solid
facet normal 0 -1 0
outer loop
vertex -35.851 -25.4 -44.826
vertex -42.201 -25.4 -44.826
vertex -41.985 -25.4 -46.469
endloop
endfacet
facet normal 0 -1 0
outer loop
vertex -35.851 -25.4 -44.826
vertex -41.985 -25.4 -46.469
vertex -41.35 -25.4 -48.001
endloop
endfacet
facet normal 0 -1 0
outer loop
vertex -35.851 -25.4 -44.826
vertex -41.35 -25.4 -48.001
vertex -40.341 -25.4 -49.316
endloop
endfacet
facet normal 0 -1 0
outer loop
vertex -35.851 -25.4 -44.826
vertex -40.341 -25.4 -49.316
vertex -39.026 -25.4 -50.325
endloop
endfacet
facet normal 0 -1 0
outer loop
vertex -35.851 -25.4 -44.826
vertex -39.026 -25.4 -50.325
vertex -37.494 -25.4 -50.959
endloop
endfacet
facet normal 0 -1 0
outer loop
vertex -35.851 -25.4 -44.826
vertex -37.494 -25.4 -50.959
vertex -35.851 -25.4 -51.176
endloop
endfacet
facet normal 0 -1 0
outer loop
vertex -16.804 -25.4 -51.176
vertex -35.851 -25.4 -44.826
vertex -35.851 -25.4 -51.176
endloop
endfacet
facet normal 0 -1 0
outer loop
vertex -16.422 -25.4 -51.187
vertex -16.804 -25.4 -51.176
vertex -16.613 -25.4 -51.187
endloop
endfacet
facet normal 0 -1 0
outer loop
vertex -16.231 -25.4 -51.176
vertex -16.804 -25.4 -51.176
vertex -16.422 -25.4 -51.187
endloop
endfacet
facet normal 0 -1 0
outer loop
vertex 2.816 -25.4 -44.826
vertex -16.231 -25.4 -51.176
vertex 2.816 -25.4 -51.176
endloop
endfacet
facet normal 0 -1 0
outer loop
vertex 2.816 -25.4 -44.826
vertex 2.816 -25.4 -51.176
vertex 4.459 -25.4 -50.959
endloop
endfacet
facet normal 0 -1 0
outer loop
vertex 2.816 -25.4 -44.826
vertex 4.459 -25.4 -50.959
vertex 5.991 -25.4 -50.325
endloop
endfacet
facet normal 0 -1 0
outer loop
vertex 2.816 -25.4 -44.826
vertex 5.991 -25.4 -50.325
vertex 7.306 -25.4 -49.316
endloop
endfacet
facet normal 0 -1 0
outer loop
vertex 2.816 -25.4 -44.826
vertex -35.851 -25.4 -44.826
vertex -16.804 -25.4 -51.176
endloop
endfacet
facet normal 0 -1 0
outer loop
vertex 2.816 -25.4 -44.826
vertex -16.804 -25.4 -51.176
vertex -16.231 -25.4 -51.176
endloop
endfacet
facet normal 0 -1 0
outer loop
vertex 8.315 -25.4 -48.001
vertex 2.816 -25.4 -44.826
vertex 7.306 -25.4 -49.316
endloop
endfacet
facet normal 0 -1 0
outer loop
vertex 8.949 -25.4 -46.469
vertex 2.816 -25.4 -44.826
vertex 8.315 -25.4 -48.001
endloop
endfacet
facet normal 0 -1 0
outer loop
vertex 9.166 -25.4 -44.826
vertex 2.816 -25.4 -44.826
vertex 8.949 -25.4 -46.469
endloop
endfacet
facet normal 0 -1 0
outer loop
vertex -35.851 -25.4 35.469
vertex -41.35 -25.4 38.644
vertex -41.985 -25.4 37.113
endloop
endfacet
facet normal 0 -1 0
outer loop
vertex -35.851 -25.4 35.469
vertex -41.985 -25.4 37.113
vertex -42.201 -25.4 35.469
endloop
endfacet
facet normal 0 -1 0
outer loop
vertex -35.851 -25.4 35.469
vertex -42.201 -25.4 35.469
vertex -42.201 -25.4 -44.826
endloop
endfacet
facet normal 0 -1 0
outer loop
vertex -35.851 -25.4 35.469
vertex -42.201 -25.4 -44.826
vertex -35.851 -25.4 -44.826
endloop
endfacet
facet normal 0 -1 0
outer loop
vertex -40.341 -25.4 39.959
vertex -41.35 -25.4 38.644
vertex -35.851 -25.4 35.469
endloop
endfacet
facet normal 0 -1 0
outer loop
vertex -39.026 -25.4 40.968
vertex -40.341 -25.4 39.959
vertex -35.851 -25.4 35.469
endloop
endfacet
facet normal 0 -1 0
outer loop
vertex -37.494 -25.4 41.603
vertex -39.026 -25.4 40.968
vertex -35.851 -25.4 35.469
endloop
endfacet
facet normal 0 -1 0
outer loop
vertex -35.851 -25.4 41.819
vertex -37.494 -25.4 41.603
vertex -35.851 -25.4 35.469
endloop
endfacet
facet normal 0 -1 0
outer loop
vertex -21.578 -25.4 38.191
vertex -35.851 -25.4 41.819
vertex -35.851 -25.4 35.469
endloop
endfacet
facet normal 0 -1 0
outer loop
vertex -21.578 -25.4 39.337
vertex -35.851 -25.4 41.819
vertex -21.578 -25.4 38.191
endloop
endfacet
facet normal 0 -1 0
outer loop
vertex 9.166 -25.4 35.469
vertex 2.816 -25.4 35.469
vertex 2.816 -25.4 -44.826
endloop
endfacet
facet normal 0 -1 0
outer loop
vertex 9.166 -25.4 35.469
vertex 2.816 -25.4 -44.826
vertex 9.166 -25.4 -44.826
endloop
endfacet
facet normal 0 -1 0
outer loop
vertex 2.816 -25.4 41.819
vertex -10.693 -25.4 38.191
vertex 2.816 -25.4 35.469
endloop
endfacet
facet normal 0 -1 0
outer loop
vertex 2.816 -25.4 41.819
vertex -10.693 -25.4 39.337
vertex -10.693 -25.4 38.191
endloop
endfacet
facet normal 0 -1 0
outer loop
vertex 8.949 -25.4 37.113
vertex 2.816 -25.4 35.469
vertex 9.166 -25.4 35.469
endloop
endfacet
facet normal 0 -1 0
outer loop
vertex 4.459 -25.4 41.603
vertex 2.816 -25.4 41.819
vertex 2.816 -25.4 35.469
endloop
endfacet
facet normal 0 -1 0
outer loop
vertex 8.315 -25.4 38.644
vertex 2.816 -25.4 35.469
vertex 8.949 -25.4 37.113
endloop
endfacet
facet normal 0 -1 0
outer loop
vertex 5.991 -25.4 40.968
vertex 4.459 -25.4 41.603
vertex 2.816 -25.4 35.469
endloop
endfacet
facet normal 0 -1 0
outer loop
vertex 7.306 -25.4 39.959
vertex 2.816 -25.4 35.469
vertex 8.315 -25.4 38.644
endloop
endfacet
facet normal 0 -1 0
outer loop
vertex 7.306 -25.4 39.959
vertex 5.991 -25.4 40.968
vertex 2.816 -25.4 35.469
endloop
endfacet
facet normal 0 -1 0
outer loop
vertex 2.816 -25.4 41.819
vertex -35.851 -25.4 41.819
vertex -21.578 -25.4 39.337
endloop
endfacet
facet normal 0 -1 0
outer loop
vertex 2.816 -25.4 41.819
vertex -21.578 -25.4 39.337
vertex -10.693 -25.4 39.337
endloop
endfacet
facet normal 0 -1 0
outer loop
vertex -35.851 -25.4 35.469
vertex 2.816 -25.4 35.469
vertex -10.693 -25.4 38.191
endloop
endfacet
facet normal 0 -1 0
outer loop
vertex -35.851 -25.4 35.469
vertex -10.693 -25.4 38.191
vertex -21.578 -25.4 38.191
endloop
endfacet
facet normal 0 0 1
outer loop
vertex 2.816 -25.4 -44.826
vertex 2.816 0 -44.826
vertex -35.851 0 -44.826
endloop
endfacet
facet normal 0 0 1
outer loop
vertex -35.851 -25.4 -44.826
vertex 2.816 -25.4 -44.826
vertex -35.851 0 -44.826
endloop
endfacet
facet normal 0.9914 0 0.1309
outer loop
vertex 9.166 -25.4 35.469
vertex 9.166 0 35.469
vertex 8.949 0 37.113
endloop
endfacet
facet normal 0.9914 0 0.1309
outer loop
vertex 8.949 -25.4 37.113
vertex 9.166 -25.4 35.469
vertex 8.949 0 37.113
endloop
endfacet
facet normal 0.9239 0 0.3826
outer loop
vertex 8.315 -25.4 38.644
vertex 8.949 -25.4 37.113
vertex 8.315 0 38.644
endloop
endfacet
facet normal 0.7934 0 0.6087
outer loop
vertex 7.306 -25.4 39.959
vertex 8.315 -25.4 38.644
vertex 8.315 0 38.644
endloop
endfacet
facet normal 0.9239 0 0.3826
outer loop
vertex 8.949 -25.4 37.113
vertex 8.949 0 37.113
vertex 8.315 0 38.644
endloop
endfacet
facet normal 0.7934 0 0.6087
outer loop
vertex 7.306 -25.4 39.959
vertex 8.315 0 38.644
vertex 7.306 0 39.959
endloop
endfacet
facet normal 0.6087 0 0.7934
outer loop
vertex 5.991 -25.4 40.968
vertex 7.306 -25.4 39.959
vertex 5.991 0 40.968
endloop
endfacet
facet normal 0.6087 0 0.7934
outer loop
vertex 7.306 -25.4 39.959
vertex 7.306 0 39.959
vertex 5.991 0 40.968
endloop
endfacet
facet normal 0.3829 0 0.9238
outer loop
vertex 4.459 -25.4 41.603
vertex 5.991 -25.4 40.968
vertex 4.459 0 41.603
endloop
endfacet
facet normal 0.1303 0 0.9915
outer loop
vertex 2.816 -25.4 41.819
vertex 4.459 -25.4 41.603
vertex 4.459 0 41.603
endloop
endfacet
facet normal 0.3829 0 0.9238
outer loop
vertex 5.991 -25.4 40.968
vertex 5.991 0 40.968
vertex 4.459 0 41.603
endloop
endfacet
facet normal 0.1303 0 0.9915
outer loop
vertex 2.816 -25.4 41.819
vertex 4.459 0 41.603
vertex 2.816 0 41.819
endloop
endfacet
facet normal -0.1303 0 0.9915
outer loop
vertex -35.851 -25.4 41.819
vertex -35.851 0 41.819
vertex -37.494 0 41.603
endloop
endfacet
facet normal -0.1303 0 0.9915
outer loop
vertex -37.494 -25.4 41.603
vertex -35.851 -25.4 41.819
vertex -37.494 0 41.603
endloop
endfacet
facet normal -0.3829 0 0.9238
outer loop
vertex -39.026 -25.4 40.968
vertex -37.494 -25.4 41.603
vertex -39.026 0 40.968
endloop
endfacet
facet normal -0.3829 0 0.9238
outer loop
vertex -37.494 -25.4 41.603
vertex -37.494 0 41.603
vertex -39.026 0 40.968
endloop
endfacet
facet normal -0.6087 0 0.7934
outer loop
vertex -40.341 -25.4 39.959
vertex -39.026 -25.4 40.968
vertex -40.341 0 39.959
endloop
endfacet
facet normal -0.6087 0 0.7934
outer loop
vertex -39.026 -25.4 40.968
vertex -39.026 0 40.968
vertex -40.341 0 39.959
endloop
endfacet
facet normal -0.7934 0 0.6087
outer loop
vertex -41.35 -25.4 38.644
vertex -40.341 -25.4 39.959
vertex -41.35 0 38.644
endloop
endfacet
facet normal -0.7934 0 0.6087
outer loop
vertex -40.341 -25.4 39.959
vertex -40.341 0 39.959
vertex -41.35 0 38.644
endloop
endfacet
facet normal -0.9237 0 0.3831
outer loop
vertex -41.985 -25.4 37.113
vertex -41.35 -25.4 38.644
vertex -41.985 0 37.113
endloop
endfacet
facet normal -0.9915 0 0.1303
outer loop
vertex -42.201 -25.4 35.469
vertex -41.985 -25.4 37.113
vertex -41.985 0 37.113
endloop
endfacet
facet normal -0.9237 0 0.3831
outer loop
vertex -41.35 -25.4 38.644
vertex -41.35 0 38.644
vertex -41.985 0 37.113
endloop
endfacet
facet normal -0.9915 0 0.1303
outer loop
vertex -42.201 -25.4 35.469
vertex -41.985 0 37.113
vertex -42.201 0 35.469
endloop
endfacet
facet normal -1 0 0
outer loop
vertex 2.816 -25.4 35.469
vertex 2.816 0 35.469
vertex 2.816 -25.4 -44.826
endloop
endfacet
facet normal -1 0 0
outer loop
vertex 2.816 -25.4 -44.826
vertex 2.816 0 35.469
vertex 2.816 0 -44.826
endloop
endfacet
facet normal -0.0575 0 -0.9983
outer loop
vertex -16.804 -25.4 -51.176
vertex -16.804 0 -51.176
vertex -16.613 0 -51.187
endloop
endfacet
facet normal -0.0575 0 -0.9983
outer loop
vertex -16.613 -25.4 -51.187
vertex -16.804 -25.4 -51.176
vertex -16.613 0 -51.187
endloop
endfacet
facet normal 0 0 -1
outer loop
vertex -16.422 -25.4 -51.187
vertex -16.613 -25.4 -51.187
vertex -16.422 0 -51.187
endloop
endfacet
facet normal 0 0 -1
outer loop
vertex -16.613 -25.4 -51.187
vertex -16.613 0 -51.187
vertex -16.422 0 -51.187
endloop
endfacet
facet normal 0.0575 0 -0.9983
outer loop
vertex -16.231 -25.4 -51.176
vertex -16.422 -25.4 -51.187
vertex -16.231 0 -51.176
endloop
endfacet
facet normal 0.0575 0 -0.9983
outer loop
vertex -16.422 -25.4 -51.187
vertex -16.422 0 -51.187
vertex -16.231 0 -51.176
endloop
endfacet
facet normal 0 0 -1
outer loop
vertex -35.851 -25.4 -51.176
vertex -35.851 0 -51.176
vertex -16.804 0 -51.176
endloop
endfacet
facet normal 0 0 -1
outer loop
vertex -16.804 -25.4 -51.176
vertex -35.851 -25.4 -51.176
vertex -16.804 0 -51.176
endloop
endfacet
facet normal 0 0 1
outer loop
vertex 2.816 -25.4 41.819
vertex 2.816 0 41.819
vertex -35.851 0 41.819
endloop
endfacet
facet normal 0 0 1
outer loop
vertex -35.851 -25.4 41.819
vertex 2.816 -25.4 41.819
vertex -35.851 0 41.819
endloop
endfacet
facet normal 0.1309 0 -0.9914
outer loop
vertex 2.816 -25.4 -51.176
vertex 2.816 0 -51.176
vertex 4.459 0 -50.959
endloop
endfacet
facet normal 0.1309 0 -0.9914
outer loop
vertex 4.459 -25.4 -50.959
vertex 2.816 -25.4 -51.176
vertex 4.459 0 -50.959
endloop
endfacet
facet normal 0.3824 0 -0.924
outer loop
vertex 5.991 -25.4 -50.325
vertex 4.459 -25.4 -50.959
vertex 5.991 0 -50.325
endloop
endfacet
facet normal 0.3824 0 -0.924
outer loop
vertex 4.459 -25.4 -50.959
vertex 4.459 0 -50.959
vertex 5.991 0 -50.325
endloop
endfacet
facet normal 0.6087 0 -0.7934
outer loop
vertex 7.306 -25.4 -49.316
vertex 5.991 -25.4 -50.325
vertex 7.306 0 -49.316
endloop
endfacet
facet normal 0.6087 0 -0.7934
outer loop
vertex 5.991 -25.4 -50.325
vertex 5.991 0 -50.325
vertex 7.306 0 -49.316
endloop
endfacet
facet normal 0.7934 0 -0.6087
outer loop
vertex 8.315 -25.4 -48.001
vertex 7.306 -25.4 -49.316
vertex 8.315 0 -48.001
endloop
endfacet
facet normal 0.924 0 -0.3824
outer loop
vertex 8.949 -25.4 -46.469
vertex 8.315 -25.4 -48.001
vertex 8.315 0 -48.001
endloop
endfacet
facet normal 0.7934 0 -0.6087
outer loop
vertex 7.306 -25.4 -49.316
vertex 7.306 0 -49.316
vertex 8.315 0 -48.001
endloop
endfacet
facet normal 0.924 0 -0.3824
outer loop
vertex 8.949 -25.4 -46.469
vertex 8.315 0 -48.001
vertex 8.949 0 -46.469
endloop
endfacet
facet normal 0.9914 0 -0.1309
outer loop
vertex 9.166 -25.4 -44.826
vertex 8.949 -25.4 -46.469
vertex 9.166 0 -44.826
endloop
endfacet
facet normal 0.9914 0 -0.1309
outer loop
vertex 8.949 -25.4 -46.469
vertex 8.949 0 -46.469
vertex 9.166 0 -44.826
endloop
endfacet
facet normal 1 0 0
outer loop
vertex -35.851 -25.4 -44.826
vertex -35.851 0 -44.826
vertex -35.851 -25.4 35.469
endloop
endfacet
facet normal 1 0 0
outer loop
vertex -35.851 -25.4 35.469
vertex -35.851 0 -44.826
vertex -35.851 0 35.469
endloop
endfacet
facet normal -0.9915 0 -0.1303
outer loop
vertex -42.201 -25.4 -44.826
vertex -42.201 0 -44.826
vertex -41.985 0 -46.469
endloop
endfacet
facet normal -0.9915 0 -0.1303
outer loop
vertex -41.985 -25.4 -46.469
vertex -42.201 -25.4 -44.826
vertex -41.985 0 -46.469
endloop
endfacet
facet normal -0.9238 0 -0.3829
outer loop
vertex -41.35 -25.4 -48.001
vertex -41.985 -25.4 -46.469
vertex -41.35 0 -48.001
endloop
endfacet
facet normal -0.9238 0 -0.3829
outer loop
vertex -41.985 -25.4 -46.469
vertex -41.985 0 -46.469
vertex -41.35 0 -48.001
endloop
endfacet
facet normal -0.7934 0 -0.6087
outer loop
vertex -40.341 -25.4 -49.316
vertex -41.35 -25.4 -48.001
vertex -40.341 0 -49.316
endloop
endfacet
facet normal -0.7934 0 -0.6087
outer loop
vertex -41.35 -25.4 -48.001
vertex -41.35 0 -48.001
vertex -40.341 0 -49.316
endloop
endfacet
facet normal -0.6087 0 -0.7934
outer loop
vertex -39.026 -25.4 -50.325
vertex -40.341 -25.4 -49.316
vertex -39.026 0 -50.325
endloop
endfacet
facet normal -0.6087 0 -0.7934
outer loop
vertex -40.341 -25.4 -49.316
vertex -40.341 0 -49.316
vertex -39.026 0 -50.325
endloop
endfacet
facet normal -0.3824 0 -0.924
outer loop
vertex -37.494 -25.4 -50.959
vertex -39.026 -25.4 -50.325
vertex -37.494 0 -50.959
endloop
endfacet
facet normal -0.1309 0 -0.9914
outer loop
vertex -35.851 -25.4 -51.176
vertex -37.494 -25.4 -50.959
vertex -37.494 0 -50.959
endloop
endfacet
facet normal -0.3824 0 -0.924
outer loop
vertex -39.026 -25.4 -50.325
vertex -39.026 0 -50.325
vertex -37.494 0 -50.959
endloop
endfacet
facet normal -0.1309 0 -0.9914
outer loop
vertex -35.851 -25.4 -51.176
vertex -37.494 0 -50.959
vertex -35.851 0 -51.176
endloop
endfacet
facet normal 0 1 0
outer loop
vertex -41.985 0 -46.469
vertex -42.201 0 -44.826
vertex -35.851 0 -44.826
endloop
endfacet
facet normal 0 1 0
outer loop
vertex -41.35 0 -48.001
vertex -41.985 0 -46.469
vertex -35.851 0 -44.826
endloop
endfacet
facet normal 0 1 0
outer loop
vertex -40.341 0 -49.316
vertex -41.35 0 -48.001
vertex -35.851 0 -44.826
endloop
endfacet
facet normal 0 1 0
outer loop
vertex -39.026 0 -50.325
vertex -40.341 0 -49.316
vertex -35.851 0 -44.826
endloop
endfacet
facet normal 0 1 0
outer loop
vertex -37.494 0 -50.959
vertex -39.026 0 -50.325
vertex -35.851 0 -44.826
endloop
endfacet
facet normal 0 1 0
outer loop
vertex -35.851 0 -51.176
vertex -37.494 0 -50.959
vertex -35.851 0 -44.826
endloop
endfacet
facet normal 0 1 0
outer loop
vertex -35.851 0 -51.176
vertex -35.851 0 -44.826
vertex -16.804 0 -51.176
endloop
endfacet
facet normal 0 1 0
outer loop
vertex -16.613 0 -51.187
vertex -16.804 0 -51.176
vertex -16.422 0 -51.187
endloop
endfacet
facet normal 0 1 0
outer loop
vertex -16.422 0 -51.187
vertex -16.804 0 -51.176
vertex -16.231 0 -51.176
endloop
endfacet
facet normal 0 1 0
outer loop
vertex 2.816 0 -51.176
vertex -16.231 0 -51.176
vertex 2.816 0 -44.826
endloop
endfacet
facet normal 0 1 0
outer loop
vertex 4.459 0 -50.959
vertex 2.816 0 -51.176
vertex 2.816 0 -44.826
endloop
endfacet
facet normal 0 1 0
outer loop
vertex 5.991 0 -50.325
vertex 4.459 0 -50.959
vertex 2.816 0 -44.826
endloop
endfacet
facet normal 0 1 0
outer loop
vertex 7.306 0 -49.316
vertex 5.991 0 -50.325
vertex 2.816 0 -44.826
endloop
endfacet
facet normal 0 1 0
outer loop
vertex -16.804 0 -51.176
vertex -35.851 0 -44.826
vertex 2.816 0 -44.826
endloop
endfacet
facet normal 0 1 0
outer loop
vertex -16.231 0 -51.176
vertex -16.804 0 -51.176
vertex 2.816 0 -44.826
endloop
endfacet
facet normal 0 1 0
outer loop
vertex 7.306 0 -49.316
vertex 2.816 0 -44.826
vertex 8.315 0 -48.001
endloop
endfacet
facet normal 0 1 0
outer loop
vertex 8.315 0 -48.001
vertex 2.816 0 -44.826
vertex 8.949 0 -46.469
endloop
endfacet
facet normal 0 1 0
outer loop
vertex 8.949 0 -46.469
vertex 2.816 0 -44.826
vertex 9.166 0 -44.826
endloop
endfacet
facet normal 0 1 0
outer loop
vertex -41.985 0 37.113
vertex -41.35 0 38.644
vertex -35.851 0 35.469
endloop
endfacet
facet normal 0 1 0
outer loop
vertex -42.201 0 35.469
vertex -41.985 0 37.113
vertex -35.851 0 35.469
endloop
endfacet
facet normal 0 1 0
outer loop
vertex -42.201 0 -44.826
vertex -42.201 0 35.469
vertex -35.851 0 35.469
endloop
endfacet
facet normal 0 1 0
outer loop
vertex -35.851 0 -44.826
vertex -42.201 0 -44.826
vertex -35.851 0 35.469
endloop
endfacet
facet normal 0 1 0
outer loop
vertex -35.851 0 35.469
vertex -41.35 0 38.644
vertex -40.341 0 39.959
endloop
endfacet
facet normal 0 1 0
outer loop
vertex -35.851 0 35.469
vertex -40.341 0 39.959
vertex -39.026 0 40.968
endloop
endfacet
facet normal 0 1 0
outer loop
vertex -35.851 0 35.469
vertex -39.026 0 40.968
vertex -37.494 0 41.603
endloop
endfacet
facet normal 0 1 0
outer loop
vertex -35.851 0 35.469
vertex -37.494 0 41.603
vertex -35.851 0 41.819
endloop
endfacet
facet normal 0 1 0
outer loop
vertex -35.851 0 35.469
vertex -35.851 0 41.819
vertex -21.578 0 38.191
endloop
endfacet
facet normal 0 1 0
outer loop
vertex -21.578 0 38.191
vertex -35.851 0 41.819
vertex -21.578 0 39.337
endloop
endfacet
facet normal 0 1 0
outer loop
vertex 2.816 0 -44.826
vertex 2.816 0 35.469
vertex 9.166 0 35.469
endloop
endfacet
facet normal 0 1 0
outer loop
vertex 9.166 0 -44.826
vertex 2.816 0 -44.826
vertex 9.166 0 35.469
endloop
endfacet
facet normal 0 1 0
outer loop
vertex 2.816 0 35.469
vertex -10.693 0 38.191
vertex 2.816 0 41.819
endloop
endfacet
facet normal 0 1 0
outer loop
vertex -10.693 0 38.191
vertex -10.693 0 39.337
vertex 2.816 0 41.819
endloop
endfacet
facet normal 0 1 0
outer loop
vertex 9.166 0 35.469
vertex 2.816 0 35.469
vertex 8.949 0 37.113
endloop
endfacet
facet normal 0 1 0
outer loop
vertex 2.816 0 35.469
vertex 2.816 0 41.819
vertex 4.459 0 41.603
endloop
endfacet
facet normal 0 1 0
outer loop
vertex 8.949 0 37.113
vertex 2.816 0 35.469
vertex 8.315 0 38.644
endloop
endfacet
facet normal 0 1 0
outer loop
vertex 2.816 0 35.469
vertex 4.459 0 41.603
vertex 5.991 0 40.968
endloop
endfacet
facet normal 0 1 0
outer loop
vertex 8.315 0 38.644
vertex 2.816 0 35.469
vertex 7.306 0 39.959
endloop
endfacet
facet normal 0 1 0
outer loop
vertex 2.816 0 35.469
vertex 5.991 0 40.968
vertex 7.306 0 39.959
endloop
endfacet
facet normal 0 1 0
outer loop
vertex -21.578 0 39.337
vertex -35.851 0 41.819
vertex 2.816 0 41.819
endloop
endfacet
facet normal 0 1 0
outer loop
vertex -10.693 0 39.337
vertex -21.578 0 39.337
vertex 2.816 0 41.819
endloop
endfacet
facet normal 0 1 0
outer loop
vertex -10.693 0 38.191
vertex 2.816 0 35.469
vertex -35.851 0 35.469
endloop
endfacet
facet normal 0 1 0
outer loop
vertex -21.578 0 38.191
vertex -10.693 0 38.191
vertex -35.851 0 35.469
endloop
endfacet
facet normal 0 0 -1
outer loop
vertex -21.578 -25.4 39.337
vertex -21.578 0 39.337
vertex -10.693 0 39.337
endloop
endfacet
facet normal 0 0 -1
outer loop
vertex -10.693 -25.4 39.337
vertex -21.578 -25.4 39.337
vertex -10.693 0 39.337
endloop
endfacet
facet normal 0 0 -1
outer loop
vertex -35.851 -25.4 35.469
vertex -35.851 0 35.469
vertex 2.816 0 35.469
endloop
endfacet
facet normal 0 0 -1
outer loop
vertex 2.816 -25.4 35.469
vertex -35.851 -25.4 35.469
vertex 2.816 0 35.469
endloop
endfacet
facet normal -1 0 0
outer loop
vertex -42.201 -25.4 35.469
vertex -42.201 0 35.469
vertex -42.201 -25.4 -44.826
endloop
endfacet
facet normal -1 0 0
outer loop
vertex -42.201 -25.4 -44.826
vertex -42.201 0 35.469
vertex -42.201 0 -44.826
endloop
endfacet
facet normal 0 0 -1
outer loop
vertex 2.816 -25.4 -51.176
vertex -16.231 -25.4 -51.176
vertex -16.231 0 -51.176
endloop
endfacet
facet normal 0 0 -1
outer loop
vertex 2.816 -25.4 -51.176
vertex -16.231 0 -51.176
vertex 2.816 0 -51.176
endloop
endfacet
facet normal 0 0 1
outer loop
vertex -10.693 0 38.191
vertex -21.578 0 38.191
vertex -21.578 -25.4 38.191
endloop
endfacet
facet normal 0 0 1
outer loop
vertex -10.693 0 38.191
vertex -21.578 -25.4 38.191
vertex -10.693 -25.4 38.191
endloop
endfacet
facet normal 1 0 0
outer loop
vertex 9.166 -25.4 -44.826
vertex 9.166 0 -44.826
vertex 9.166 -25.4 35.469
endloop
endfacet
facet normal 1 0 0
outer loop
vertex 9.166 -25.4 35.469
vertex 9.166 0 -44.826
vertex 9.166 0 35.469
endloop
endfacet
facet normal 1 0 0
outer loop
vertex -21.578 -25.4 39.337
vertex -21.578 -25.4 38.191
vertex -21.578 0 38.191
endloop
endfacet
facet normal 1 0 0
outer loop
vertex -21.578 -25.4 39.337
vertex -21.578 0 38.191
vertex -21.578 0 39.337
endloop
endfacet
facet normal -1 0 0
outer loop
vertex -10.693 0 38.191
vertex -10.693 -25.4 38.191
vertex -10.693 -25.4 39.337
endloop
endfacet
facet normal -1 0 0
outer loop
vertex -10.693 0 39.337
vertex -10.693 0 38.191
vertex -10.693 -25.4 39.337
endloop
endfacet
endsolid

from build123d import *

# Parameters (mm, degrees)
F0_W     = 10.8844153583
F0_H     = 1.1457279325
F1_DEPTH = 25.4


with BuildPart() as f1:
    # F0 (on Front) → F1 (new body)
    with BuildSketch(Plane.XZ):
        with BuildLine():
            Line((2.8158243909, 41.8190695345), (-35.8509788454, 41.8190695345))
            ThreePointArc((-35.8509788454, 41.8190695345), (-40.3411069059, 39.9591975951), (-42.2009788454, 35.4690695345))
            Line((-42.2009788454, 35.4690695345), (-42.2009788454, -44.8258476496))
            ThreePointArc((-42.2009788454, -44.8258476496), (-40.3411069059, -49.3159757101), (-35.8509788454, -51.1758476496))
            Line((-35.8509788454, -51.1758476496), (-16.8040137117, -51.1758476496))
            ThreePointArc((-16.8040137117, -51.1758476496), (-19.7564134277, -48.2901591682), (-17.5108828007, -44.8258476496))
            Line((-17.5108828007, -44.8258476496), (-35.8509788454, -44.8258476496))
            Line((-35.8509788454, -44.8258476496), (-35.8509788454, 35.4690695345))
            Line((-35.8509788454, 35.4690695345), (2.8158243909, 35.4690695345))
            Line((2.8158243909, 35.4690695345), (2.8158243909, -44.8258476496))
            Line((2.8158243909, -44.8258476496), (-15.5242716537, -44.8258476496))
            ThreePointArc((-15.5242716537, -44.8258476496), (-13.8853656886, -46.0082877402), (-13.2587354849, -47.9296185076))
            ThreePointArc((-13.2587354849, -47.9296185076), (-14.114090107, -50.1303681901), (-16.2311407427, -51.1758476496))
            Line((-16.2311407427, -51.1758476496), (2.8158243909, -51.1758476496))
            ThreePointArc((2.8158243909, -51.1758476496), (7.3059524515, -49.3159757101), (9.1658243909, -44.8258476496))
            Line((9.1658243909, -44.8258476496), (9.1658243909, 35.4690695345))
            ThreePointArc((9.1658243909, 35.4690695345), (7.3059524515, 39.9591975951), (2.8158243909, 41.8190695345))
        make_face()
        with Locations((-16.135668382, 38.763795048)):
            Rectangle(F0_W, F0_H, mode=Mode.SUBTRACT)
        with BuildLine():
            ThreePointArc((-17.5108828007, -44.8258476496), (-19.7564134277, -48.2901591682), (-16.8040137117, -51.1758476496))
            Line((-16.8040137117, -51.1758476496), (-16.2311407427, -51.1758476496))
            ThreePointArc((-16.2311407427, -51.1758476496), (-14.114090107, -50.1303681901), (-13.2587354849, -47.9296185076))
            ThreePointArc((-13.2587354849, -47.9296185076), (-13.8853656886, -46.0082877402), (-15.5242716537, -44.8258476496))
            Line((-15.5242716537, -44.8258476496), (-17.5108828007, -44.8258476496))
        make_face()
        with BuildLine():
            Line((-16.2311407427, -51.1758476496), (-16.8040137117, -51.1758476496))
            ThreePointArc((-16.8040137117, -51.1758476496), (-16.5175772272, -51.18846025), (-16.2311407427, -51.1758476496))
        make_face()
    extrude(amount=F1_DEPTH)


solid = f1.part
